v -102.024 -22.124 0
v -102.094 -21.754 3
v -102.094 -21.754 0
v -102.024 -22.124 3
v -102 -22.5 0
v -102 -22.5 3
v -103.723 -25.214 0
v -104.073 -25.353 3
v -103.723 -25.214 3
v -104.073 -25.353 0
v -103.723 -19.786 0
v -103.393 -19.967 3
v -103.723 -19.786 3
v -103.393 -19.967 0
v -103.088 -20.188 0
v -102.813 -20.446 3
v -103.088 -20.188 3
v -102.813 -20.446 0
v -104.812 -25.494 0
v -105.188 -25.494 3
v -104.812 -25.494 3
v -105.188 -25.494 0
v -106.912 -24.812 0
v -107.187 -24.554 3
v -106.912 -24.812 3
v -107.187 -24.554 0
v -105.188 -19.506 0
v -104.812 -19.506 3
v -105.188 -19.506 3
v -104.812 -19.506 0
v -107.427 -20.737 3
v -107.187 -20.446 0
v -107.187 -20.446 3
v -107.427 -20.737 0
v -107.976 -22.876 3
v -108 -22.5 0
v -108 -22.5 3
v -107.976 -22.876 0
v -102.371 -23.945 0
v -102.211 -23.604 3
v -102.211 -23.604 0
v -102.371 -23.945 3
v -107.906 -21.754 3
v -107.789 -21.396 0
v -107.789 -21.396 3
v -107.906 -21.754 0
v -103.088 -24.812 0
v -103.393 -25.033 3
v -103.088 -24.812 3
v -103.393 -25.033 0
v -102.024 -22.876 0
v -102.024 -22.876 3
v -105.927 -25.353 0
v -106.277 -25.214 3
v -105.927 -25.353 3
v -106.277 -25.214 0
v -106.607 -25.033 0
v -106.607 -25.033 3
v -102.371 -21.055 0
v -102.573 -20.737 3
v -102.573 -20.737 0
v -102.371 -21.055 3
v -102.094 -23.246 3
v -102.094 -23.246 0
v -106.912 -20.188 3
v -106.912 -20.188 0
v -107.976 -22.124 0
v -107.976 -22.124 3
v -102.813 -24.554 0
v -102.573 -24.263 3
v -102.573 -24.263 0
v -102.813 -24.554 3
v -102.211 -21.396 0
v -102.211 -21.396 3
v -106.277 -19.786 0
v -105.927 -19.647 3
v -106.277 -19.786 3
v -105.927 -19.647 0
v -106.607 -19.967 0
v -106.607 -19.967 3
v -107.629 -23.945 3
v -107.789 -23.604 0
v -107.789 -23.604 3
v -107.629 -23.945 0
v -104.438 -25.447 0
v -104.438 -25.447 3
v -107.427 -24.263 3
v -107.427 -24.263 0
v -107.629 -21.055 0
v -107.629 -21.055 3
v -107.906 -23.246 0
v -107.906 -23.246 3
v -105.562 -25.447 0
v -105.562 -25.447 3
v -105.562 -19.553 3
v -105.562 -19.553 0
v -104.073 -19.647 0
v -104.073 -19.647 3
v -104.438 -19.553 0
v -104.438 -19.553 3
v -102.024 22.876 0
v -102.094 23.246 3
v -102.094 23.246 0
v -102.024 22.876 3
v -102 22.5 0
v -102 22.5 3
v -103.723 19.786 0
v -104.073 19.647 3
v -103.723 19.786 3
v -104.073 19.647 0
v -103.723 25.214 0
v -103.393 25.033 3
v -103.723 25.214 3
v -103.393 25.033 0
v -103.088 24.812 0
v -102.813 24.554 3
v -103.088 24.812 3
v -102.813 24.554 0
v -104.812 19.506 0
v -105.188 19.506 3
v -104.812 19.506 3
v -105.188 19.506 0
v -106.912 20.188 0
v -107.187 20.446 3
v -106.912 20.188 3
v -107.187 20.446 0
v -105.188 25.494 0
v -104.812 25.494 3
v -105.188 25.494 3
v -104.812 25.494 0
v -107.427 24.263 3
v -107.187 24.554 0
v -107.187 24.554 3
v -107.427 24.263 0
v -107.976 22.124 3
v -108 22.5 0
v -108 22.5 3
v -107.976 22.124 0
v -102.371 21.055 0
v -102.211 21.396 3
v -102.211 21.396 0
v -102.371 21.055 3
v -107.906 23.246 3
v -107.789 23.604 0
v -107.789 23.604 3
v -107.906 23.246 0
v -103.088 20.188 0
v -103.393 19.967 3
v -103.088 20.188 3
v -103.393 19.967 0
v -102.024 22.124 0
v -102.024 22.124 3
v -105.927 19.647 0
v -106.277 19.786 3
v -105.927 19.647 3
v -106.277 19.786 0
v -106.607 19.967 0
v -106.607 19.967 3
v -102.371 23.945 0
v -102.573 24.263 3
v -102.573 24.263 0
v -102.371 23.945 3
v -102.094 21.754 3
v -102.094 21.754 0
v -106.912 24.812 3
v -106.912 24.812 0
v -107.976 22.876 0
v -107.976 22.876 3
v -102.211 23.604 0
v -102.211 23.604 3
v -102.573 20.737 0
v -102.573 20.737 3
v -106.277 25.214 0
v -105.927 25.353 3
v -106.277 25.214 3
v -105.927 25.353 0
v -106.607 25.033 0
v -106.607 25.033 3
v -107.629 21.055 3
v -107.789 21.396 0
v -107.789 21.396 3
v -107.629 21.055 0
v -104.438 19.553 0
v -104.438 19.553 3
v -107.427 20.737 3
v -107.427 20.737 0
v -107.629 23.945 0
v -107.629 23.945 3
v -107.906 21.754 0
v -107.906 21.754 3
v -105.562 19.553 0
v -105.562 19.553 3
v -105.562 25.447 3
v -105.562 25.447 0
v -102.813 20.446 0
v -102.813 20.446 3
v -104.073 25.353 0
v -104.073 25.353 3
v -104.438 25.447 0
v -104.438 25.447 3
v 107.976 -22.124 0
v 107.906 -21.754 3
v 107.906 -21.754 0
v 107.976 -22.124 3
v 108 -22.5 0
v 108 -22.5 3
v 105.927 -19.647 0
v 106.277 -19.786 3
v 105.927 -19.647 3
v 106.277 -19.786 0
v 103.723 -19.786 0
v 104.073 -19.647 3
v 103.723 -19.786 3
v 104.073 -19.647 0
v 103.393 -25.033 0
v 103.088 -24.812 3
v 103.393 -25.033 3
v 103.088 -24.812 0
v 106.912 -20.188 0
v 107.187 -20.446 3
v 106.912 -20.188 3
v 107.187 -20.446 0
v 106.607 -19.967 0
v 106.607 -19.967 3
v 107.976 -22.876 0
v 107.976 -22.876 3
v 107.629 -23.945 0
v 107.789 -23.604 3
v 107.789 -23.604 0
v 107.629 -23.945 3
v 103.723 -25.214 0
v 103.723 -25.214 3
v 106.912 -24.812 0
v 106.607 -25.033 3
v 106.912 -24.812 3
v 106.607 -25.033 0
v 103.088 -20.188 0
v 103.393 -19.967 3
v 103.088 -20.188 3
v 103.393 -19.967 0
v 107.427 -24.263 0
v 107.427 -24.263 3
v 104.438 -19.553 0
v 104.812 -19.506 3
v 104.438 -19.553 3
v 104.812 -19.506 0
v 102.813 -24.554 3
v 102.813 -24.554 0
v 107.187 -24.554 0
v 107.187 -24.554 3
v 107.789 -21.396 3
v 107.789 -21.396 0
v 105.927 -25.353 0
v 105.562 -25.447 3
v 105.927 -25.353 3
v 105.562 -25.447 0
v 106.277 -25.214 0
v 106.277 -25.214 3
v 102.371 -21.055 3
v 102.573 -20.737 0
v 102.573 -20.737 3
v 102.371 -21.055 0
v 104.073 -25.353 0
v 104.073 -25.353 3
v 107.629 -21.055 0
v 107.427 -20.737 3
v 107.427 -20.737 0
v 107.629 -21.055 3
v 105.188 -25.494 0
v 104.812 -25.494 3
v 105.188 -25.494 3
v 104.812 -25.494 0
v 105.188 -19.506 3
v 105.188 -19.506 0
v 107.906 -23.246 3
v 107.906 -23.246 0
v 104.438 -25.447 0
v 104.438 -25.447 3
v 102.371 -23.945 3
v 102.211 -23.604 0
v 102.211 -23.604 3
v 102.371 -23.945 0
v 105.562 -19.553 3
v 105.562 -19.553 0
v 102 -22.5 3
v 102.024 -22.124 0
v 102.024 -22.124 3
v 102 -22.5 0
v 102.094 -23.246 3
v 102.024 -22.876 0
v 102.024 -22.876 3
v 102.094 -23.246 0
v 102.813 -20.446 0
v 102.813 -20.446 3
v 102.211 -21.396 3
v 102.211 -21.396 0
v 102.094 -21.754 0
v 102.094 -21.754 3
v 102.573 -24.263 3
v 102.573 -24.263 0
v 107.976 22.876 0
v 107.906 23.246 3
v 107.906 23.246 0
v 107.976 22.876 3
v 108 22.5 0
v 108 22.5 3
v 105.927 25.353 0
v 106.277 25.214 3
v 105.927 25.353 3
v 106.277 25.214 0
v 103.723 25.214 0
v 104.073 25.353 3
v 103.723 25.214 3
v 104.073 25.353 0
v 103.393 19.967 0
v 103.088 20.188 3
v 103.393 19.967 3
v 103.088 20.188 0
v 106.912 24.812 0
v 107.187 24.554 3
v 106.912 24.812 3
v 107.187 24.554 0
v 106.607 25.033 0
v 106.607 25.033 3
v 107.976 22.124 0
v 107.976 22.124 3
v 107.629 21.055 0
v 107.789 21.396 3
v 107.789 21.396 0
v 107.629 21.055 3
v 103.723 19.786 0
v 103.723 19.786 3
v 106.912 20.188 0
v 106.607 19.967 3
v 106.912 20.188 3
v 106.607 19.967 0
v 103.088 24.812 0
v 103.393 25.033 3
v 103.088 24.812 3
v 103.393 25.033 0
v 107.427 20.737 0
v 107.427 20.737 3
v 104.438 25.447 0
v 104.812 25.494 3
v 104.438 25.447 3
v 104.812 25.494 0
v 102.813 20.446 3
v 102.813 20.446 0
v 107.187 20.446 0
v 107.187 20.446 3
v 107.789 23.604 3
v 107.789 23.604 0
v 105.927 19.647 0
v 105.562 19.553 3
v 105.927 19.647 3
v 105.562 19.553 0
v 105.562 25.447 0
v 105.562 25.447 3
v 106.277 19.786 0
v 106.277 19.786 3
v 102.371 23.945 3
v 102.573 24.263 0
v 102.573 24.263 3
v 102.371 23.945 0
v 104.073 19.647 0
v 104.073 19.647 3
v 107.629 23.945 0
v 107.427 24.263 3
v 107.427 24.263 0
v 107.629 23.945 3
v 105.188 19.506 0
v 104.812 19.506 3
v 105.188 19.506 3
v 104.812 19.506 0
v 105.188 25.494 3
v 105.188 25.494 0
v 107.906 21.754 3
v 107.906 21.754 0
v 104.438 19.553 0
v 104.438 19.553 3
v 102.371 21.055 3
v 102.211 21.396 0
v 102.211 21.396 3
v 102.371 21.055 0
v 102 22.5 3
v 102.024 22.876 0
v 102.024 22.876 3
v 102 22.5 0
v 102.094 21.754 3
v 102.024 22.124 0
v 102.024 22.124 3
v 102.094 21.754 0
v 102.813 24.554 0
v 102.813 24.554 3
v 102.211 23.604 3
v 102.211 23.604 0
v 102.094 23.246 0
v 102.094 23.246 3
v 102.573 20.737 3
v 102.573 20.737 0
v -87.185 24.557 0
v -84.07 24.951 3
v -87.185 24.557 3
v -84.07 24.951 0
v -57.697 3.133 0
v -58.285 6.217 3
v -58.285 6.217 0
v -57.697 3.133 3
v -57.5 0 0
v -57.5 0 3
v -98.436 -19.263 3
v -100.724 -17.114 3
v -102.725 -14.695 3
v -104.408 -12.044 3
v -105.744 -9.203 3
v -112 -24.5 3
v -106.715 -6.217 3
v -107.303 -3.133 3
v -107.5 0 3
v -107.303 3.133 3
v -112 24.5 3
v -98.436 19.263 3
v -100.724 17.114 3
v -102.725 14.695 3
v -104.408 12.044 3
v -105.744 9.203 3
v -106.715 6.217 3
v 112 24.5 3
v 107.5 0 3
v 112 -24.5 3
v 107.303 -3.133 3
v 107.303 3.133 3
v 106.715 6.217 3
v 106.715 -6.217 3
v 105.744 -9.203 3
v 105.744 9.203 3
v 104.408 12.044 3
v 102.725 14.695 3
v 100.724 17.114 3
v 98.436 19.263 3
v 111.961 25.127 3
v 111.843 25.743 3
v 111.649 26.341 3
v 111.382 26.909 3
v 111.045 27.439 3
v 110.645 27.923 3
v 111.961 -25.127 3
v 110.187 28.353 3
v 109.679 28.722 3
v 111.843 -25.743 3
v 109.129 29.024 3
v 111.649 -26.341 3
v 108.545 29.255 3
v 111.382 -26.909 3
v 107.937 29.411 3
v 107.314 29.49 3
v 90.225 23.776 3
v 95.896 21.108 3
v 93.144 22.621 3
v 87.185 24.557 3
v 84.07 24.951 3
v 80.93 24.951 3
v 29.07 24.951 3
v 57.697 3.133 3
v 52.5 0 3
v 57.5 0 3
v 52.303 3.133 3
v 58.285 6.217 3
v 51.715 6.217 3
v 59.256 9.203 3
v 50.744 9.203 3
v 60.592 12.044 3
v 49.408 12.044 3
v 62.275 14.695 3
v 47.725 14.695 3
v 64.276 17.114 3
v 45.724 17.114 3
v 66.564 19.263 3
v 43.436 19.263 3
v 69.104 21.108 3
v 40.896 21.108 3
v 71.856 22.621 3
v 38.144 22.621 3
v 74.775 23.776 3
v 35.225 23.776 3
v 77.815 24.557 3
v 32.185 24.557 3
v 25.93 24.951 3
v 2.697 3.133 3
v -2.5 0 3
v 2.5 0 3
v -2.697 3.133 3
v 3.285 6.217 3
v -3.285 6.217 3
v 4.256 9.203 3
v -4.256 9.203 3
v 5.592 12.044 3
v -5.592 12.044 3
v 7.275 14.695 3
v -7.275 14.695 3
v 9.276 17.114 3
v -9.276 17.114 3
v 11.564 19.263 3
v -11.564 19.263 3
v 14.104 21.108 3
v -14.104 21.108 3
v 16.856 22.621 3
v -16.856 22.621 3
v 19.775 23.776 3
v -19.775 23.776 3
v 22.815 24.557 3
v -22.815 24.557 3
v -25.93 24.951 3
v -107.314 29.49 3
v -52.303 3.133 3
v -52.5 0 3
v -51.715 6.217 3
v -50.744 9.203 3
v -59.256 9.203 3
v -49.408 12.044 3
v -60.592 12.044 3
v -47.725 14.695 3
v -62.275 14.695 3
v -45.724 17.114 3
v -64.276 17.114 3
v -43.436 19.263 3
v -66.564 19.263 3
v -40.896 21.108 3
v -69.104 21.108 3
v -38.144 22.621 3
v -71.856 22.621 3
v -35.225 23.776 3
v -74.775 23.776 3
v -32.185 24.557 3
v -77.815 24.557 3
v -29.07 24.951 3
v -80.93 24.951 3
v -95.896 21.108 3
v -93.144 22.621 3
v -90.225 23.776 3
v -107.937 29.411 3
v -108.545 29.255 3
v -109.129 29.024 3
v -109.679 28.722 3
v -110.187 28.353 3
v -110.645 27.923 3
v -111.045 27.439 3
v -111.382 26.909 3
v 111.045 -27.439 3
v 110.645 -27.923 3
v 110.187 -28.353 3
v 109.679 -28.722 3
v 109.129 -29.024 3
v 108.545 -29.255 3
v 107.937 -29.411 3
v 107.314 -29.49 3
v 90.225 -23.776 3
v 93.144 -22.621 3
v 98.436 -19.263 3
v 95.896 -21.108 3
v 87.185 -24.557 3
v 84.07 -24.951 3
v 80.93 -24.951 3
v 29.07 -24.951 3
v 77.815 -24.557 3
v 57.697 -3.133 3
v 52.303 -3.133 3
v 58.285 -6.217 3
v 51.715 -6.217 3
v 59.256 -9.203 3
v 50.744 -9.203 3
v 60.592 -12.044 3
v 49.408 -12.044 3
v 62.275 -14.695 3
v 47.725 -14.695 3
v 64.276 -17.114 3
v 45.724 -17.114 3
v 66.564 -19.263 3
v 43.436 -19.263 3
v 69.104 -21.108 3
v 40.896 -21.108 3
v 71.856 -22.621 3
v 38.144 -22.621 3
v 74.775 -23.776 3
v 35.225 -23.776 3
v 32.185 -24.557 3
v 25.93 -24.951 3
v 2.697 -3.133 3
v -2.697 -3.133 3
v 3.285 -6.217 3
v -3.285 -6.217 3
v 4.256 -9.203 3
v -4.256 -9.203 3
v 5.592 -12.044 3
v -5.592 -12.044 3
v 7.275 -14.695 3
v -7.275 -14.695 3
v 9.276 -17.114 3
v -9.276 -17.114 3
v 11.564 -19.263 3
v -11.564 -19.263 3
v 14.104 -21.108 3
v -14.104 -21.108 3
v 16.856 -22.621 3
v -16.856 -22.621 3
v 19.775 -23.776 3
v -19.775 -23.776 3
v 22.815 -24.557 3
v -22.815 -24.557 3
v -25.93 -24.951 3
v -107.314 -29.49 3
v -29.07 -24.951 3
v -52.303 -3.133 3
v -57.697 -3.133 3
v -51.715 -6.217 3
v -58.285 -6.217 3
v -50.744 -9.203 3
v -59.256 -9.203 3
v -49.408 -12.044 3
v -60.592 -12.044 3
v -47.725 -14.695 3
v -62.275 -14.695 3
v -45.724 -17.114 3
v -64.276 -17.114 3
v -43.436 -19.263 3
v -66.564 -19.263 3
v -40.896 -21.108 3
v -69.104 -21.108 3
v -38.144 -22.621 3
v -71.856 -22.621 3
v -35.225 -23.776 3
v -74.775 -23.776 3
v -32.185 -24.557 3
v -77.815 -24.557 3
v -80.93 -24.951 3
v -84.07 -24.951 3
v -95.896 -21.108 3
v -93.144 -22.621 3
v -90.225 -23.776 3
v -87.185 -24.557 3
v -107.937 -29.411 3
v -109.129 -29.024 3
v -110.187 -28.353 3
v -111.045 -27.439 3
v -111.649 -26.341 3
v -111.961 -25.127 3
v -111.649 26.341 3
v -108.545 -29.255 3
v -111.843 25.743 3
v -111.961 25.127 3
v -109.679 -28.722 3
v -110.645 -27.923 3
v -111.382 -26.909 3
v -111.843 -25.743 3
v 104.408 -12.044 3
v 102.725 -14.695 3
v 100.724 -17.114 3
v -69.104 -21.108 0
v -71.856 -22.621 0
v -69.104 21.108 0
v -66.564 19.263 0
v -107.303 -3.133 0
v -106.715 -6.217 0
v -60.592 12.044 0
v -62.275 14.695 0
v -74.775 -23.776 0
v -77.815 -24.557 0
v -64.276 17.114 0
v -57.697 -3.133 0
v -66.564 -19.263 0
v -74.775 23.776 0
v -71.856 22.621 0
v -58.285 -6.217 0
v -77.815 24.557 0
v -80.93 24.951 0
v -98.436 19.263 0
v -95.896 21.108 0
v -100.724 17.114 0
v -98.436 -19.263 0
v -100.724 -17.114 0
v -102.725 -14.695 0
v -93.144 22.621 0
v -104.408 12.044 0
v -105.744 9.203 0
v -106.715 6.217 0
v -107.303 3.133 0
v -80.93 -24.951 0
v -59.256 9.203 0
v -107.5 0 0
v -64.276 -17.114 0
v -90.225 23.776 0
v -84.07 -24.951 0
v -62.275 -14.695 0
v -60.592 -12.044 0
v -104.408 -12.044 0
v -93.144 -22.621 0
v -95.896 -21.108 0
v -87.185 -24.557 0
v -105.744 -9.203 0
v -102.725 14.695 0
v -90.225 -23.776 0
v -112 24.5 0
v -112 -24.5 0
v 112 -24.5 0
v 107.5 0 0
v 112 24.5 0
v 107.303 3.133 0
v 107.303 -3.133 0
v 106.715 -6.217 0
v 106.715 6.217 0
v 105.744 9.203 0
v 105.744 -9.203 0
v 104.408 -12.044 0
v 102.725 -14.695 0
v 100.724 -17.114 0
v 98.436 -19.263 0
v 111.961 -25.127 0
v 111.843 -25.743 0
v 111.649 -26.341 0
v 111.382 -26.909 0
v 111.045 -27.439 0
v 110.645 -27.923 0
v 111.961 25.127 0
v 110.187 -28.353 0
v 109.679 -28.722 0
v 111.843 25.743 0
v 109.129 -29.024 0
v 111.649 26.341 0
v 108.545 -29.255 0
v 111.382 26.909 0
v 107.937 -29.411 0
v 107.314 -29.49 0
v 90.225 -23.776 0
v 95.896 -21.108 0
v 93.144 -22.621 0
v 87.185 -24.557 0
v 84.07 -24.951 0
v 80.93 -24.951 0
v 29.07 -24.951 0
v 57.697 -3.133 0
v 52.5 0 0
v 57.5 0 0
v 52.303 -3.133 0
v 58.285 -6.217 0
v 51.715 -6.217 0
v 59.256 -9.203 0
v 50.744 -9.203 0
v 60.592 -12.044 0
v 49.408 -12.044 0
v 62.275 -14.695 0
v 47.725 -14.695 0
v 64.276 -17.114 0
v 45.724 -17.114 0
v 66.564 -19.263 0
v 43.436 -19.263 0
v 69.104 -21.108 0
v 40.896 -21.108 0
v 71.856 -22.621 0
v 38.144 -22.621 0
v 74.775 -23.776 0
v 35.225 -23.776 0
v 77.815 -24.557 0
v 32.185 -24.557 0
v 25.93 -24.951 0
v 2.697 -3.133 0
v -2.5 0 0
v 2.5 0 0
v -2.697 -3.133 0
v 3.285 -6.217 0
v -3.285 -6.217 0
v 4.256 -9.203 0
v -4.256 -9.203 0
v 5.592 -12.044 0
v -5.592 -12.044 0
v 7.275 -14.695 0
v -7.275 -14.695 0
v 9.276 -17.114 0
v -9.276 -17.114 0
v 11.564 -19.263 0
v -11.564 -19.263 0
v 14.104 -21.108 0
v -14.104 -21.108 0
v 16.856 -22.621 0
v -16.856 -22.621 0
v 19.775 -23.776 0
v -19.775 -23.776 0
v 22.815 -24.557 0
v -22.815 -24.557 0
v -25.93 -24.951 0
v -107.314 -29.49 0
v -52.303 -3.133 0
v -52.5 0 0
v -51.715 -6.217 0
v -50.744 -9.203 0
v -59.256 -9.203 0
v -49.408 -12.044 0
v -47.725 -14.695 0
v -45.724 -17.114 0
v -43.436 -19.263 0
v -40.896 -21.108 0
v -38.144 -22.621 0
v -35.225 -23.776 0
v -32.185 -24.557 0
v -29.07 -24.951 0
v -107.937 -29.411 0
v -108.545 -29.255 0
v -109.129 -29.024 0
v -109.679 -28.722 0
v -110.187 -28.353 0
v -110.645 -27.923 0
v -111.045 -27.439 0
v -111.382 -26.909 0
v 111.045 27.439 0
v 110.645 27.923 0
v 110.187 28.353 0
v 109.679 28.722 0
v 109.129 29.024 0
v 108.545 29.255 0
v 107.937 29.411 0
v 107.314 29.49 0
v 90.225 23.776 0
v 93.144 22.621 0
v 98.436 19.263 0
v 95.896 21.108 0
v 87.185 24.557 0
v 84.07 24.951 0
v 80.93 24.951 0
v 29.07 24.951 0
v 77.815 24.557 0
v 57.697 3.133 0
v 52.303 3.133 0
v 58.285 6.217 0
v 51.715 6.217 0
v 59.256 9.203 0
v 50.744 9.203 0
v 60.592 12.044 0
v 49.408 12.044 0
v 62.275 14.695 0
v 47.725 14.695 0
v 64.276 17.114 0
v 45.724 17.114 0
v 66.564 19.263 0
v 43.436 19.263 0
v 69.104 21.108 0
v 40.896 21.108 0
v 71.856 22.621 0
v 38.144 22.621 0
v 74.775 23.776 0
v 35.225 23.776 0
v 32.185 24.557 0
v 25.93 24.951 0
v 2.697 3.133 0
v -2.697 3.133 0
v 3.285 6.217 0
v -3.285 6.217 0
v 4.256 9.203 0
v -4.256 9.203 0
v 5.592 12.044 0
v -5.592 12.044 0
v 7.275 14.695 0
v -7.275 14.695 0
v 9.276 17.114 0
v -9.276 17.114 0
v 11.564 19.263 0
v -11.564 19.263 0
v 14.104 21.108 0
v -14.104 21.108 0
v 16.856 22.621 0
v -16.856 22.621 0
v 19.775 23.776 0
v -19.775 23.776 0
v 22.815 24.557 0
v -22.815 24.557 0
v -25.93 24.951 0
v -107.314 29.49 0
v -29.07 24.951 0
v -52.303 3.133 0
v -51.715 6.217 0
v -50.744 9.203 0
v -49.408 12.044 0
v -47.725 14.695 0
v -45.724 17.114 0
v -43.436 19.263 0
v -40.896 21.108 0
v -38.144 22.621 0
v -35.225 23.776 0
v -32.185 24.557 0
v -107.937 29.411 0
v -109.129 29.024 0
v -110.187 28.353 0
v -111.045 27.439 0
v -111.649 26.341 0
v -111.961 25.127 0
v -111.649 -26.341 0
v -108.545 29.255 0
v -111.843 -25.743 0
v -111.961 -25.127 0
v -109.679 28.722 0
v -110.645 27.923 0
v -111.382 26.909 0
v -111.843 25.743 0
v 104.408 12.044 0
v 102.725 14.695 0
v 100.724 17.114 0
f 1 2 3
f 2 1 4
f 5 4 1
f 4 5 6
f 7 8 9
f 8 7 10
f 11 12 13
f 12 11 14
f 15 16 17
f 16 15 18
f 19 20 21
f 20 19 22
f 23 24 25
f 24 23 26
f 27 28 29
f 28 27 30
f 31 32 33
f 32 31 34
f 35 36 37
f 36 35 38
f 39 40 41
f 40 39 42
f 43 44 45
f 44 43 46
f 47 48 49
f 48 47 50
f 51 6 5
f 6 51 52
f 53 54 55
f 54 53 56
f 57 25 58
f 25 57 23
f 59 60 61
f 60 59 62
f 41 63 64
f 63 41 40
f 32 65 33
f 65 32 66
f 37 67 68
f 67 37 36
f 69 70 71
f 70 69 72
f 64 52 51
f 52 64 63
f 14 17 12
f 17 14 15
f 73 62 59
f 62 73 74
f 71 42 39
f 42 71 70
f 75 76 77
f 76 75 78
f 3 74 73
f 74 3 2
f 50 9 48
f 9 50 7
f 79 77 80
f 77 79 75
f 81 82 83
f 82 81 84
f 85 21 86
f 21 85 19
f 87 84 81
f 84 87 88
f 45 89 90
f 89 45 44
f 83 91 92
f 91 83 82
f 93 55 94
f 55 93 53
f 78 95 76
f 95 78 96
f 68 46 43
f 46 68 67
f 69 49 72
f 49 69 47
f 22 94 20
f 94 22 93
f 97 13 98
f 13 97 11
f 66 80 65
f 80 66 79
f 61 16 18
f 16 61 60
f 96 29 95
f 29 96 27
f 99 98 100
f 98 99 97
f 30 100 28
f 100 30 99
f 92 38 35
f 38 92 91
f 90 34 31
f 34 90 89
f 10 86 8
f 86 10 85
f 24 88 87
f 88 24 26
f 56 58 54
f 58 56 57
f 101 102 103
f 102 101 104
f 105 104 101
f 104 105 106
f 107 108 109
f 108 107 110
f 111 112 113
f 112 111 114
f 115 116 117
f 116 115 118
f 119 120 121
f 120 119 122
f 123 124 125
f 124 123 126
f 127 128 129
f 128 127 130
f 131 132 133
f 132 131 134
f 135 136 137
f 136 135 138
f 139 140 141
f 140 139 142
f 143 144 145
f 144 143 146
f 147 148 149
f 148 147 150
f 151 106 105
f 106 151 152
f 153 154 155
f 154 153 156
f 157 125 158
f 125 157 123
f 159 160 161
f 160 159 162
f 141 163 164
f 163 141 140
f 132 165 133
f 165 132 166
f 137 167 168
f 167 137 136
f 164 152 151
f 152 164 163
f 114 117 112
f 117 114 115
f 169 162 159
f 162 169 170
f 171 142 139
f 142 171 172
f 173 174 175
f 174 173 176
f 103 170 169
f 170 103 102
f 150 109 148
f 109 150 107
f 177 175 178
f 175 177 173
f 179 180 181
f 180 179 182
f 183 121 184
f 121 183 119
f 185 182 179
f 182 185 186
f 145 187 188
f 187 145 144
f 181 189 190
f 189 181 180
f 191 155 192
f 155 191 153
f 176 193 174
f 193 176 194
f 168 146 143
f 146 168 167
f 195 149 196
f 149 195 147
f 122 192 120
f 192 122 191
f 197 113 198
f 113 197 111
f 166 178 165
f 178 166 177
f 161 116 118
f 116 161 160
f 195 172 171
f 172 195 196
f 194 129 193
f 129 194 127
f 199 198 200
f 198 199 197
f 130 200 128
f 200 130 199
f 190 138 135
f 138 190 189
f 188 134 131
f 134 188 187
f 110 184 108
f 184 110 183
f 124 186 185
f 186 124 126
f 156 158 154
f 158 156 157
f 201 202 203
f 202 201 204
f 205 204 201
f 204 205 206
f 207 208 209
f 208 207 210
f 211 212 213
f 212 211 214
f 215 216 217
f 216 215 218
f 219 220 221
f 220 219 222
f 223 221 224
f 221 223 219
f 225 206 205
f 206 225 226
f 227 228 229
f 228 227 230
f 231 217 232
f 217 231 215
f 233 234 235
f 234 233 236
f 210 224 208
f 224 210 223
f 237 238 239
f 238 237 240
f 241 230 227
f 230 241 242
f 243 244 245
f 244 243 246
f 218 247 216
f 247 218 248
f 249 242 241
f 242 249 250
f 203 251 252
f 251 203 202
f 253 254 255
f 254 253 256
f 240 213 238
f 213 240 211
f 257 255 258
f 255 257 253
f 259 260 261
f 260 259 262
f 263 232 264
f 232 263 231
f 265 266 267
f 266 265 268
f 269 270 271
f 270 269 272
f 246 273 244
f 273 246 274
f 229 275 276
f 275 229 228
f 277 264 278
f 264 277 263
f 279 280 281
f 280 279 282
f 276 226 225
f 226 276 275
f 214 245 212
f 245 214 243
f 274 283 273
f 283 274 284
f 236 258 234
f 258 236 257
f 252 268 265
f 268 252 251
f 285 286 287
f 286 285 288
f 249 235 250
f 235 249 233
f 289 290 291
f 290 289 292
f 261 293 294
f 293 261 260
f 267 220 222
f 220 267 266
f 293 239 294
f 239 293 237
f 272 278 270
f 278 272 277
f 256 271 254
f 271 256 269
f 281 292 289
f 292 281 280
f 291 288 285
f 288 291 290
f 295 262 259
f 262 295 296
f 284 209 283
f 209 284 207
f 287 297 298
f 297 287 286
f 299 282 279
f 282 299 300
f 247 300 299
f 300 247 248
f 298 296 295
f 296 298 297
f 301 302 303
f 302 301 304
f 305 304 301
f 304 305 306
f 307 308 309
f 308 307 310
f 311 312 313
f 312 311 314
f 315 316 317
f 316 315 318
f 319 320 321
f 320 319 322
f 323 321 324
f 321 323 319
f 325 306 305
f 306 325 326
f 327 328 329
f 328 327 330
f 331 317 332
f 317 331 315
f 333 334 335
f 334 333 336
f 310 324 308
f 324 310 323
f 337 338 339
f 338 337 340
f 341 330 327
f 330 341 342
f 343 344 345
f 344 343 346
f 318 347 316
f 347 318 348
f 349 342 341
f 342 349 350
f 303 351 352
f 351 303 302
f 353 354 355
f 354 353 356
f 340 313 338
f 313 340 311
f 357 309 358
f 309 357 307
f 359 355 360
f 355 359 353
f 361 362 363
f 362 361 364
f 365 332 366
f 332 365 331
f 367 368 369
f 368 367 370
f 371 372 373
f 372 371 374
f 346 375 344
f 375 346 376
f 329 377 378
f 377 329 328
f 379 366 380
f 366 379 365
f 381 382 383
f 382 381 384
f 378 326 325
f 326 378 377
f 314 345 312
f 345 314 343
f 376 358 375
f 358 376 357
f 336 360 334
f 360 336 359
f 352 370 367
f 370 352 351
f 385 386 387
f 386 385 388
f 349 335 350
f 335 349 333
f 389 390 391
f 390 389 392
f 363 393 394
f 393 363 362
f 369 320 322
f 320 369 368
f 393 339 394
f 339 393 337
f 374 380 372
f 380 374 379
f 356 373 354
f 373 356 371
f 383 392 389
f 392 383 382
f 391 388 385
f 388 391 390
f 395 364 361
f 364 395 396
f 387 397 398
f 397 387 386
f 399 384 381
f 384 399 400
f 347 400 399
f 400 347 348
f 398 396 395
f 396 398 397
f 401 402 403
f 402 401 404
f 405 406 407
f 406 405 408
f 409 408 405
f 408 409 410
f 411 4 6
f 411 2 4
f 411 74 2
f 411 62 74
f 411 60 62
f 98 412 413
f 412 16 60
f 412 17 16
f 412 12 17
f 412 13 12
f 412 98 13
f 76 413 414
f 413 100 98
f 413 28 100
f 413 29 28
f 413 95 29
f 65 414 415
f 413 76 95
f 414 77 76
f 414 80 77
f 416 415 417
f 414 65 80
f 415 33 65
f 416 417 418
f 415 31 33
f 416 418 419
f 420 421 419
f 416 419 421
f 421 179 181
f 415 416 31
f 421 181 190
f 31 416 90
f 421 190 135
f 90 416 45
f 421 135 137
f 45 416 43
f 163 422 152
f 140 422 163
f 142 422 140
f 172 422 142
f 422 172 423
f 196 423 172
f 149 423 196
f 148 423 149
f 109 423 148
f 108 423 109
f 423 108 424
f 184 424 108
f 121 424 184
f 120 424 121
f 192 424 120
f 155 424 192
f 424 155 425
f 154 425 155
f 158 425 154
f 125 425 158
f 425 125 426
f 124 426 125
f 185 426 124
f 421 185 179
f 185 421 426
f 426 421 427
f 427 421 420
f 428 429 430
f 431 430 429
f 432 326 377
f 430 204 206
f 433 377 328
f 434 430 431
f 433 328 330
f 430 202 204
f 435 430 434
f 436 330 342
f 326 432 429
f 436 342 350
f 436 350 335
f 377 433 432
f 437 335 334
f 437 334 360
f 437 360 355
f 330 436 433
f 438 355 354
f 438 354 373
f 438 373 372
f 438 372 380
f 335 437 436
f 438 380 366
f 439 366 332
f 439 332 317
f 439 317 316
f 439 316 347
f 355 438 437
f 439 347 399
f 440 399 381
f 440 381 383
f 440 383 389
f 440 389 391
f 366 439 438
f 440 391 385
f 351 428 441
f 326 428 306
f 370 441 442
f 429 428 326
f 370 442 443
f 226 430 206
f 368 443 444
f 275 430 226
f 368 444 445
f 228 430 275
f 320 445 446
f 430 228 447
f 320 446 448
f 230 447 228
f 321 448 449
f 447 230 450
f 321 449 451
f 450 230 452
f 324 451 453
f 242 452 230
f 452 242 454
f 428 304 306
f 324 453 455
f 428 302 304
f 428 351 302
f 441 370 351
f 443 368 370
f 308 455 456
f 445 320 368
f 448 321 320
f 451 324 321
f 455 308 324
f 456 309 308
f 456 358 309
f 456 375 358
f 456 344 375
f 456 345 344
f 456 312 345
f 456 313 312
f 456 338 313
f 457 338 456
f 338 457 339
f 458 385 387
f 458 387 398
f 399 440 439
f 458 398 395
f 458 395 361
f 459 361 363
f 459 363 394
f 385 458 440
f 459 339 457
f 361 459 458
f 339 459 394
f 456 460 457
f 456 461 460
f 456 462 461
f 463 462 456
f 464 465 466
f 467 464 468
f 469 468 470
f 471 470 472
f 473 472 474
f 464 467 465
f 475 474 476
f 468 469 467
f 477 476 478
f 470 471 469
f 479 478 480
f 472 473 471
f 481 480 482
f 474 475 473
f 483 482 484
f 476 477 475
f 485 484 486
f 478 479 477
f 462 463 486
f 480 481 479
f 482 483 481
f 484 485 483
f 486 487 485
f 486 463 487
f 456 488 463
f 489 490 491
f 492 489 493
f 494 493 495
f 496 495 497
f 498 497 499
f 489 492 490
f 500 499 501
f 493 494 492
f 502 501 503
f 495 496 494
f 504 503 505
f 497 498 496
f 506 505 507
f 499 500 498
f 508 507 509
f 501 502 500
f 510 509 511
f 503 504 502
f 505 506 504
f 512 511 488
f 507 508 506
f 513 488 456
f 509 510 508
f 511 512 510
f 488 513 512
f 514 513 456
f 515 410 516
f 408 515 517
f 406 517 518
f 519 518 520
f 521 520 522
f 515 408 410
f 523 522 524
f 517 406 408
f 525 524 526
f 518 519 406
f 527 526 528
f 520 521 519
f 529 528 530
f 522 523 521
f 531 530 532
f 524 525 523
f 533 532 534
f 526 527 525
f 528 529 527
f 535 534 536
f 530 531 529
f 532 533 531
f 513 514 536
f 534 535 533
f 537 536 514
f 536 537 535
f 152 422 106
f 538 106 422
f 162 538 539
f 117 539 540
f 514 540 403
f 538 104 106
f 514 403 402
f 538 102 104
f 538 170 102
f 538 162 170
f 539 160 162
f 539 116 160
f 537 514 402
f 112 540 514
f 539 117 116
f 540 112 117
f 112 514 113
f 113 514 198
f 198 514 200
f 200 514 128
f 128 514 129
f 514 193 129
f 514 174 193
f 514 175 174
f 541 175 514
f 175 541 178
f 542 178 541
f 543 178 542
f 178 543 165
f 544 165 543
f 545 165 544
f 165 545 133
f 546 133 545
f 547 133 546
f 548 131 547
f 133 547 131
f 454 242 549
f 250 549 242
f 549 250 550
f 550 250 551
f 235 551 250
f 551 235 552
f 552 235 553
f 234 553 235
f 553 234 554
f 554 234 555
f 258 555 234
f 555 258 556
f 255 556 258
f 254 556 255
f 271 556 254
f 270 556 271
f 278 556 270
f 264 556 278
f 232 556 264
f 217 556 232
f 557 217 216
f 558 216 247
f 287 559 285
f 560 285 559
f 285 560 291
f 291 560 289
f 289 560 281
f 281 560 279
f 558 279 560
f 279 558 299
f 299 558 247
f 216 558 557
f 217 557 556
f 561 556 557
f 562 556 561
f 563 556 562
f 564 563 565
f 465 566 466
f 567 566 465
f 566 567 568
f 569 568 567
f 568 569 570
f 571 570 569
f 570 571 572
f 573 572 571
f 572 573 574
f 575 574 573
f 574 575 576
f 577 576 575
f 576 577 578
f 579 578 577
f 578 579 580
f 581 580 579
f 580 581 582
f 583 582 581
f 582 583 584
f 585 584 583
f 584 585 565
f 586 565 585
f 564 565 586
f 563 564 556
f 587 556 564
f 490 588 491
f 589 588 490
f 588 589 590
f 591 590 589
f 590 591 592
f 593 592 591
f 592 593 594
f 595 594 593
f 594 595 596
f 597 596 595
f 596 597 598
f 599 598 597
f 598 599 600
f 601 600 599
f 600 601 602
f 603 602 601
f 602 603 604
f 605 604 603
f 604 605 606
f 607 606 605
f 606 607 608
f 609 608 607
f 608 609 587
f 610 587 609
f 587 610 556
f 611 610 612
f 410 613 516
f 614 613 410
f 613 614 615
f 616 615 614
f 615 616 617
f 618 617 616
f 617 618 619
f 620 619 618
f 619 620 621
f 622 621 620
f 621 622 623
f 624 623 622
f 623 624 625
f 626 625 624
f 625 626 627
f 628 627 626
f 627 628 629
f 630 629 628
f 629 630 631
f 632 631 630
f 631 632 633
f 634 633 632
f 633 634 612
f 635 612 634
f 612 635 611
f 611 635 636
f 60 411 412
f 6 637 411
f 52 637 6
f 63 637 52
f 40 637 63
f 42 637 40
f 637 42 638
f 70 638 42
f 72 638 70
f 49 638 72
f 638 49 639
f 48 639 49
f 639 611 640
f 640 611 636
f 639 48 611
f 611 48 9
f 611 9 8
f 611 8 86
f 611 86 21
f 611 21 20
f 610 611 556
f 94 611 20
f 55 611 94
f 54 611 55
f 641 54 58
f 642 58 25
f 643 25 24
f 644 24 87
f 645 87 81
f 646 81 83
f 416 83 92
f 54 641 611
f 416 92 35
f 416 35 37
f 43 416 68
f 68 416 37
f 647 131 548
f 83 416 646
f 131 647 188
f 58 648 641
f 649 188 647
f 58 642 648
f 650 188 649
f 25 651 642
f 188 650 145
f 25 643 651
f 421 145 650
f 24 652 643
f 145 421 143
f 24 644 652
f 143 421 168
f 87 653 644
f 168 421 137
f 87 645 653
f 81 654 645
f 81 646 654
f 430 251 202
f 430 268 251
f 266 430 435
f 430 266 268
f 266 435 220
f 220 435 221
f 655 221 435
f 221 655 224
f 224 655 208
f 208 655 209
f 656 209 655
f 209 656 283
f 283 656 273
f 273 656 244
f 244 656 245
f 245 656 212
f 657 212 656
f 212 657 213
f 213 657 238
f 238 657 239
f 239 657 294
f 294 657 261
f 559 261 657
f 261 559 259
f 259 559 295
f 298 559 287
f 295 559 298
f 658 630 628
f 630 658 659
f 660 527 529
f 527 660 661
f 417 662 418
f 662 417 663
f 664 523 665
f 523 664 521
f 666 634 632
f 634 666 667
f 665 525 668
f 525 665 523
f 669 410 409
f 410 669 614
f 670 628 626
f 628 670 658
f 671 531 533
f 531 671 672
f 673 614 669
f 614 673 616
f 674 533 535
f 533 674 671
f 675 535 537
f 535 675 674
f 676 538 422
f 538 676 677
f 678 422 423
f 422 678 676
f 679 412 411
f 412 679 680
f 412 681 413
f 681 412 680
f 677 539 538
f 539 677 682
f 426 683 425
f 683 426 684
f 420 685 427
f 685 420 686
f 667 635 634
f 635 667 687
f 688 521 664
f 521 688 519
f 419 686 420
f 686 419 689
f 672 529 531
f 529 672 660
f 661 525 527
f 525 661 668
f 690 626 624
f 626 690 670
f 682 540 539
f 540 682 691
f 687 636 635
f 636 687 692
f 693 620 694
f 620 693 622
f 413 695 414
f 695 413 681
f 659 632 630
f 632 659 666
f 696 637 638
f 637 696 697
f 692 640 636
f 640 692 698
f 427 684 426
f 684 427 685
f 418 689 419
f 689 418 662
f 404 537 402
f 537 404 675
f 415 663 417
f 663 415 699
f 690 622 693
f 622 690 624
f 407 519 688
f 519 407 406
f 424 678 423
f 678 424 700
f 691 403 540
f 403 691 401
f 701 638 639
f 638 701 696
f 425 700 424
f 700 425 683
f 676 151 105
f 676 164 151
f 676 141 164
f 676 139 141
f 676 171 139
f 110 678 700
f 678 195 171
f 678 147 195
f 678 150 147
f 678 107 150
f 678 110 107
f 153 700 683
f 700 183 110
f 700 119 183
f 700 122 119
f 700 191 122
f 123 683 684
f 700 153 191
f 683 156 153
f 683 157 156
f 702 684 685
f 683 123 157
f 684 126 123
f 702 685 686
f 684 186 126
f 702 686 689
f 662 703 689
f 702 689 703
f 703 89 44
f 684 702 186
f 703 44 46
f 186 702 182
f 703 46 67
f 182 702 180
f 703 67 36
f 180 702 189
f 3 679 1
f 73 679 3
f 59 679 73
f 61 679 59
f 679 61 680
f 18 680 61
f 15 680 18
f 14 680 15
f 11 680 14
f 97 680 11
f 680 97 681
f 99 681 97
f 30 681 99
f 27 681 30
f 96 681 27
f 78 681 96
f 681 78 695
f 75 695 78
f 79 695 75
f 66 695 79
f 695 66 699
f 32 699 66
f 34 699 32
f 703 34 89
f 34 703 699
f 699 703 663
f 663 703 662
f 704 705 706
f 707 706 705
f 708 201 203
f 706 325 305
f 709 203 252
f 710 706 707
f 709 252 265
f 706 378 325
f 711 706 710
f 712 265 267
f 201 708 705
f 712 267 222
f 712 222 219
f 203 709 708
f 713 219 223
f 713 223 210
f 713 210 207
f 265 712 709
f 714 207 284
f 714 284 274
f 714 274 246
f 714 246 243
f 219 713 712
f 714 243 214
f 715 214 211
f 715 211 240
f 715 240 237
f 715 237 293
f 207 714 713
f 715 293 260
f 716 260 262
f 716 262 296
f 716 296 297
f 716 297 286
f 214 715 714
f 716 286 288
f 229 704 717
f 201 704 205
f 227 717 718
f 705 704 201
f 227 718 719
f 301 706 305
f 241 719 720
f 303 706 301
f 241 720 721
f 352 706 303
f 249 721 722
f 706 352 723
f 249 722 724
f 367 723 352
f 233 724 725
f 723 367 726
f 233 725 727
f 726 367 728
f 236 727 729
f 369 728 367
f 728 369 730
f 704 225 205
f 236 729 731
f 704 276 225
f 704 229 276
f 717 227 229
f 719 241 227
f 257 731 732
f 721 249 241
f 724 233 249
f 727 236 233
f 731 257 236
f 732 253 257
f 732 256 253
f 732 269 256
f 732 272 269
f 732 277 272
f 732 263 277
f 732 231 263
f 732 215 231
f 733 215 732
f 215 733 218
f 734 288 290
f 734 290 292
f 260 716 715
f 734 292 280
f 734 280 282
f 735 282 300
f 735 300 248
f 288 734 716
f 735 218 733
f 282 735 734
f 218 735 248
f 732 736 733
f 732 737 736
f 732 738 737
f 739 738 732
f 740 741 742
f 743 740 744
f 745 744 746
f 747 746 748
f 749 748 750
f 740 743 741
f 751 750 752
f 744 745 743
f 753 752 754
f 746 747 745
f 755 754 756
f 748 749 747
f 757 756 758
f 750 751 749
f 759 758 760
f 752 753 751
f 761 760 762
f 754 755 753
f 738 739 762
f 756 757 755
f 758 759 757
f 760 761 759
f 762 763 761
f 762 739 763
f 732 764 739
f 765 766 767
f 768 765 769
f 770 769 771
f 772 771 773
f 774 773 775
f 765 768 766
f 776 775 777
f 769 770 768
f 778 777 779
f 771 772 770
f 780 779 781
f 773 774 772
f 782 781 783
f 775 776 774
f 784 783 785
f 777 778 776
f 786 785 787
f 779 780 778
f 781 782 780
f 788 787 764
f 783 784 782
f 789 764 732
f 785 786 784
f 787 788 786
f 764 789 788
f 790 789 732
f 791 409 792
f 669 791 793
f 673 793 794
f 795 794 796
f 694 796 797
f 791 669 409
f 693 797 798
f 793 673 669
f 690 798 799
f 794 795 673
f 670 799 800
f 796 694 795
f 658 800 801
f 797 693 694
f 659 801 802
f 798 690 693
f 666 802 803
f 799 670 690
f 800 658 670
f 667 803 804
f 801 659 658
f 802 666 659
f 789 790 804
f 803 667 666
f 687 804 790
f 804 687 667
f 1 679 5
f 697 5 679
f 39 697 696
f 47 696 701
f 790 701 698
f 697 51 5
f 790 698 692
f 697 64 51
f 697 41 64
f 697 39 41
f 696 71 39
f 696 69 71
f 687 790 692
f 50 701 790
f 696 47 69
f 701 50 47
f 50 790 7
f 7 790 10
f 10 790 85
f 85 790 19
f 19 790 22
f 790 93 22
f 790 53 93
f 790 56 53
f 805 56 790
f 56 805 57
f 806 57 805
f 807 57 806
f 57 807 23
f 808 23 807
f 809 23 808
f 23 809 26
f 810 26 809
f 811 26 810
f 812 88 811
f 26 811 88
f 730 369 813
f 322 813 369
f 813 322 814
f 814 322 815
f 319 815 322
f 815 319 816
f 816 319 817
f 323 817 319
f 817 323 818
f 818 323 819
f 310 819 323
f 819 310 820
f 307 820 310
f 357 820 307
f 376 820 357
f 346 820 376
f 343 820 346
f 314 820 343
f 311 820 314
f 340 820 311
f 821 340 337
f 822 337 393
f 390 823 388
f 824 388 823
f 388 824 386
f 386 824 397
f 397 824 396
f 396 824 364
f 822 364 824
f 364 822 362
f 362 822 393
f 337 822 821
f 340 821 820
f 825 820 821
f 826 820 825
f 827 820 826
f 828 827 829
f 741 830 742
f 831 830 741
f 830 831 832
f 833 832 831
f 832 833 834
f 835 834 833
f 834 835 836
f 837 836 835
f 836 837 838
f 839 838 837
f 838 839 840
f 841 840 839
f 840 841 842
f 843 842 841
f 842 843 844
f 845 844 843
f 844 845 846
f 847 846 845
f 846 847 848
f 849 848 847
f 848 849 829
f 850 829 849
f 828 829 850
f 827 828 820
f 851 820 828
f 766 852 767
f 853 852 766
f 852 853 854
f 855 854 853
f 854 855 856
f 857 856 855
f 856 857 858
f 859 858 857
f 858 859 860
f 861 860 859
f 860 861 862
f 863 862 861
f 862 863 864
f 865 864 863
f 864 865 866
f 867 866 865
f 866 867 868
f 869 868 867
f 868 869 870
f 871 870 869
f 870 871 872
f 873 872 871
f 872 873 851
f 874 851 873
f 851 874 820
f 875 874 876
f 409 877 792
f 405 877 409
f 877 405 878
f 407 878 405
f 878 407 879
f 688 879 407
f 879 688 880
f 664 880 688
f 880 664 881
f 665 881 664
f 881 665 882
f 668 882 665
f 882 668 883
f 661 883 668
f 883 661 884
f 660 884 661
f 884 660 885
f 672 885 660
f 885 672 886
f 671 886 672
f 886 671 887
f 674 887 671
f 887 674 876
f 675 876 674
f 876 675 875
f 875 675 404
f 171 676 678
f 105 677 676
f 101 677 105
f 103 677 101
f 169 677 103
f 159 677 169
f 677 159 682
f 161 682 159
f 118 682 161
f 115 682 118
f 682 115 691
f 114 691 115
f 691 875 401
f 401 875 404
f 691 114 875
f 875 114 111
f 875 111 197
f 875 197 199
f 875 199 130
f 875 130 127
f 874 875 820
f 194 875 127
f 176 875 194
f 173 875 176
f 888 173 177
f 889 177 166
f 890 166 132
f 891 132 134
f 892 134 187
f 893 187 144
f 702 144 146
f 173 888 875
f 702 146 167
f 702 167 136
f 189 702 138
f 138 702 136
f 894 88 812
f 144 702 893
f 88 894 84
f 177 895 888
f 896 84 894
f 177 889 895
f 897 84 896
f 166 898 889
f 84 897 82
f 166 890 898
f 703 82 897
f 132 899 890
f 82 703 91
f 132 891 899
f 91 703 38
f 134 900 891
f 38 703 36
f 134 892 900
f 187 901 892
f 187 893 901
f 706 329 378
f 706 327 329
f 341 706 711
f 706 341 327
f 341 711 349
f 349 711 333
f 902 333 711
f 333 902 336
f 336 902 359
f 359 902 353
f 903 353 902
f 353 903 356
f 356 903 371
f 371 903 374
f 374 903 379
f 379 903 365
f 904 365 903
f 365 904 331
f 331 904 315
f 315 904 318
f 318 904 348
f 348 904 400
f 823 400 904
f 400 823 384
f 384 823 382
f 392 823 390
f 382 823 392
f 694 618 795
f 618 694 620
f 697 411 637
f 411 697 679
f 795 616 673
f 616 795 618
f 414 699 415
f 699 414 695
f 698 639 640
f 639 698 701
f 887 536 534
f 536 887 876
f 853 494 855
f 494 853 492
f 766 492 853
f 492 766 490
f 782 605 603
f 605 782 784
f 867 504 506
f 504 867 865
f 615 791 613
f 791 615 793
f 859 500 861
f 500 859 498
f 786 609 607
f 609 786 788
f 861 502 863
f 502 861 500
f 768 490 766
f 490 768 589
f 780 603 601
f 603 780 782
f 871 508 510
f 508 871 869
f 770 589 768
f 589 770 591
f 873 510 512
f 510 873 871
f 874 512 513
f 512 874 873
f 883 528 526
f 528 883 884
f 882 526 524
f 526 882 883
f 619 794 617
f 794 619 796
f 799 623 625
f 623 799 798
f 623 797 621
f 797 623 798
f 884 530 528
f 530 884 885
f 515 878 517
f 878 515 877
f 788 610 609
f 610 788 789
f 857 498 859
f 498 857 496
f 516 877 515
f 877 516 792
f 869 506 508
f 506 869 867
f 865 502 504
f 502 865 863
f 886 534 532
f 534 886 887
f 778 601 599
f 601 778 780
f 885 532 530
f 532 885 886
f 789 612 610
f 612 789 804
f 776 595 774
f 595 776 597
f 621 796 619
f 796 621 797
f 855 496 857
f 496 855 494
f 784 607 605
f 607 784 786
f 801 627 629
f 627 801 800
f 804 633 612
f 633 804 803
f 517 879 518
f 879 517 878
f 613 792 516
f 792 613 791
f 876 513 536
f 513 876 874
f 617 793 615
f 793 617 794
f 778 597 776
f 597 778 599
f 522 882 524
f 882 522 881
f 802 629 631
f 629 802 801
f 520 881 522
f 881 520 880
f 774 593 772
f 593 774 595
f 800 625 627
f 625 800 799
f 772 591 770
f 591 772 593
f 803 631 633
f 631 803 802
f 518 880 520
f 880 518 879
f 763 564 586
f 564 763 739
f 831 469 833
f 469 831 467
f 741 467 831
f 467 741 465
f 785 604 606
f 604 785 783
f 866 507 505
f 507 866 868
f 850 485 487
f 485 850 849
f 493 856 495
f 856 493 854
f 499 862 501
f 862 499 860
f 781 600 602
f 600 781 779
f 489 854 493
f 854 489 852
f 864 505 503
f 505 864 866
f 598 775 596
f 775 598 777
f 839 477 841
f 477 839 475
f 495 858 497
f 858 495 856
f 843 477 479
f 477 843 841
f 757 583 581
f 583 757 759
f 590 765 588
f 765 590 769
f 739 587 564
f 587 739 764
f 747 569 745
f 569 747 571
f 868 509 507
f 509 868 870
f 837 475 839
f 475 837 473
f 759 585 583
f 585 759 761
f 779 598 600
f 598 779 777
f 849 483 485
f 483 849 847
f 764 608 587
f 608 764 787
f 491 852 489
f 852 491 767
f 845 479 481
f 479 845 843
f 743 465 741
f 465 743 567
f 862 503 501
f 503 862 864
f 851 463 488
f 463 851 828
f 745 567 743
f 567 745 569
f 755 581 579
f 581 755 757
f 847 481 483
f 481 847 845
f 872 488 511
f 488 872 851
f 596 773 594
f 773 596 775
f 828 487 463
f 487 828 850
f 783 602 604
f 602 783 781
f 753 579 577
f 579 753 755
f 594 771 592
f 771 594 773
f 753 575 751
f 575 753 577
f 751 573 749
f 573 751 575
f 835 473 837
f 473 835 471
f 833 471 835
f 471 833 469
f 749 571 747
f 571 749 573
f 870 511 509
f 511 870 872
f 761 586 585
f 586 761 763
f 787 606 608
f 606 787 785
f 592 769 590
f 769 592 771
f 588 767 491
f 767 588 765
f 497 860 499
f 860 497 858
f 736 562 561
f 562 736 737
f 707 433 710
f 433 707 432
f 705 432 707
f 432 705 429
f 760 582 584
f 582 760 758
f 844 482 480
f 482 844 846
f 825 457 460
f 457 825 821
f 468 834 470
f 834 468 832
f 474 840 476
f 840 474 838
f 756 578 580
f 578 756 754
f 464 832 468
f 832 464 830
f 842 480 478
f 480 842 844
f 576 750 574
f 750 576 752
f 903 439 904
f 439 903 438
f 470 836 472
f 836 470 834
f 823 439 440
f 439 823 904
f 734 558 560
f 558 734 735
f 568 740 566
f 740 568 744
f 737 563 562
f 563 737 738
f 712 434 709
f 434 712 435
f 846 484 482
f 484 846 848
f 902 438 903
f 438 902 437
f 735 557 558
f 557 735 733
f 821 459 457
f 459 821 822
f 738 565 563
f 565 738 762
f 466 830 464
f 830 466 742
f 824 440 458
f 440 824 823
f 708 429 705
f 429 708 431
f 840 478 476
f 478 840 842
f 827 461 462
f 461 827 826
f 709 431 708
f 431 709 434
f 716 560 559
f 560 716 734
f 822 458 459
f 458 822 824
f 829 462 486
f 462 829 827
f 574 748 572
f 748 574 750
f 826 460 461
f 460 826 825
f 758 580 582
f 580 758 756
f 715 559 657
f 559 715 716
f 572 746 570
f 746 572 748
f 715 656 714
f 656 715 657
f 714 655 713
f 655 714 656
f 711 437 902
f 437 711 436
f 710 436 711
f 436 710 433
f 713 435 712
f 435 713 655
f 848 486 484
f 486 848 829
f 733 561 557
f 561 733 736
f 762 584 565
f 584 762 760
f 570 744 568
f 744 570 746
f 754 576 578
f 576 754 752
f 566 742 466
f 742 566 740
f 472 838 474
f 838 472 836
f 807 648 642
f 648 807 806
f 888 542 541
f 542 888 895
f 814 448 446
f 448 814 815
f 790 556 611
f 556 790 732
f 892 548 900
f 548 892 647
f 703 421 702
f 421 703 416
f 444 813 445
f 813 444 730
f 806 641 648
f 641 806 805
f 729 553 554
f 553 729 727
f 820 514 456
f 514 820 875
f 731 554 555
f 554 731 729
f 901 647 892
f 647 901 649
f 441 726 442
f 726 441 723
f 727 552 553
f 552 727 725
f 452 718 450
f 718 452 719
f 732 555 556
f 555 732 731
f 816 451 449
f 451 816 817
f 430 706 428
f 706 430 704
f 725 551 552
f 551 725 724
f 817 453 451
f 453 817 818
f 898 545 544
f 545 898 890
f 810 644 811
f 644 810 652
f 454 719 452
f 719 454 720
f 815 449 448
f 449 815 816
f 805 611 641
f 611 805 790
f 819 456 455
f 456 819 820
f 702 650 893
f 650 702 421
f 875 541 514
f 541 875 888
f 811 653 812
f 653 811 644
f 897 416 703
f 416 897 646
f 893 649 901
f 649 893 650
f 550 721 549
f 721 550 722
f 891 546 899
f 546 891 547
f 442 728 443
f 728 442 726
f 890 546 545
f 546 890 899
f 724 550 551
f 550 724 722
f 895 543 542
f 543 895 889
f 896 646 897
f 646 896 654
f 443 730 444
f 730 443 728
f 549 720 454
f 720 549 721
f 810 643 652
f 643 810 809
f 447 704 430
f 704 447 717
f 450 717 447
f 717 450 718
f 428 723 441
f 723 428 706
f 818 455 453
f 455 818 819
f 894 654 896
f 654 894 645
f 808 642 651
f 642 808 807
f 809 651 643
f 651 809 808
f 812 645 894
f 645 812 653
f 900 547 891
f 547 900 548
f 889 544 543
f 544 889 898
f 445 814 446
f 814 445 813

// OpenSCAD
$fn = 50;


difference() {
	union() {
		hull() {
			translate(v = [-107.0000000000, 24.5000000000, 0]) {
				cylinder(h = 3, r = 5);
			}
			translate(v = [107.0000000000, 24.5000000000, 0]) {
				cylinder(h = 3, r = 5);
			}
			translate(v = [-107.0000000000, -24.5000000000, 0]) {
				cylinder(h = 3, r = 5);
			}
			translate(v = [107.0000000000, -24.5000000000, 0]) {
				cylinder(h = 3, r = 5);
			}
		}
	}
	union() {
		#translate(v = [-105.0000000000, -22.5000000000, -100.0000000000]) {
			cylinder(h = 200, r = 3.0000000000);
		}
		#translate(v = [-105.0000000000, 22.5000000000, -100.0000000000]) {
			cylinder(h = 200, r = 3.0000000000);
		}
		#translate(v = [105.0000000000, -22.5000000000, -100.0000000000]) {
			cylinder(h = 200, r = 3.0000000000);
		}
		#translate(v = [105.0000000000, 22.5000000000, -100.0000000000]) {
			cylinder(h = 200, r = 3.0000000000);
		}
		#translate(v = [-82.5000000000, 0, 0]) {
			cylinder(h = 3, r = 25.0000000000);
		}
		#translate(v = [-27.5000000000, 0, 0]) {
			cylinder(h = 3, r = 25.0000000000);
		}
		#translate(v = [27.5000000000, 0, 0]) {
			cylinder(h = 3, r = 25.0000000000);
		}
		#translate(v = [82.5000000000, 0, 0]) {
			cylinder(h = 3, r = 25.0000000000);
		}
	}
}
